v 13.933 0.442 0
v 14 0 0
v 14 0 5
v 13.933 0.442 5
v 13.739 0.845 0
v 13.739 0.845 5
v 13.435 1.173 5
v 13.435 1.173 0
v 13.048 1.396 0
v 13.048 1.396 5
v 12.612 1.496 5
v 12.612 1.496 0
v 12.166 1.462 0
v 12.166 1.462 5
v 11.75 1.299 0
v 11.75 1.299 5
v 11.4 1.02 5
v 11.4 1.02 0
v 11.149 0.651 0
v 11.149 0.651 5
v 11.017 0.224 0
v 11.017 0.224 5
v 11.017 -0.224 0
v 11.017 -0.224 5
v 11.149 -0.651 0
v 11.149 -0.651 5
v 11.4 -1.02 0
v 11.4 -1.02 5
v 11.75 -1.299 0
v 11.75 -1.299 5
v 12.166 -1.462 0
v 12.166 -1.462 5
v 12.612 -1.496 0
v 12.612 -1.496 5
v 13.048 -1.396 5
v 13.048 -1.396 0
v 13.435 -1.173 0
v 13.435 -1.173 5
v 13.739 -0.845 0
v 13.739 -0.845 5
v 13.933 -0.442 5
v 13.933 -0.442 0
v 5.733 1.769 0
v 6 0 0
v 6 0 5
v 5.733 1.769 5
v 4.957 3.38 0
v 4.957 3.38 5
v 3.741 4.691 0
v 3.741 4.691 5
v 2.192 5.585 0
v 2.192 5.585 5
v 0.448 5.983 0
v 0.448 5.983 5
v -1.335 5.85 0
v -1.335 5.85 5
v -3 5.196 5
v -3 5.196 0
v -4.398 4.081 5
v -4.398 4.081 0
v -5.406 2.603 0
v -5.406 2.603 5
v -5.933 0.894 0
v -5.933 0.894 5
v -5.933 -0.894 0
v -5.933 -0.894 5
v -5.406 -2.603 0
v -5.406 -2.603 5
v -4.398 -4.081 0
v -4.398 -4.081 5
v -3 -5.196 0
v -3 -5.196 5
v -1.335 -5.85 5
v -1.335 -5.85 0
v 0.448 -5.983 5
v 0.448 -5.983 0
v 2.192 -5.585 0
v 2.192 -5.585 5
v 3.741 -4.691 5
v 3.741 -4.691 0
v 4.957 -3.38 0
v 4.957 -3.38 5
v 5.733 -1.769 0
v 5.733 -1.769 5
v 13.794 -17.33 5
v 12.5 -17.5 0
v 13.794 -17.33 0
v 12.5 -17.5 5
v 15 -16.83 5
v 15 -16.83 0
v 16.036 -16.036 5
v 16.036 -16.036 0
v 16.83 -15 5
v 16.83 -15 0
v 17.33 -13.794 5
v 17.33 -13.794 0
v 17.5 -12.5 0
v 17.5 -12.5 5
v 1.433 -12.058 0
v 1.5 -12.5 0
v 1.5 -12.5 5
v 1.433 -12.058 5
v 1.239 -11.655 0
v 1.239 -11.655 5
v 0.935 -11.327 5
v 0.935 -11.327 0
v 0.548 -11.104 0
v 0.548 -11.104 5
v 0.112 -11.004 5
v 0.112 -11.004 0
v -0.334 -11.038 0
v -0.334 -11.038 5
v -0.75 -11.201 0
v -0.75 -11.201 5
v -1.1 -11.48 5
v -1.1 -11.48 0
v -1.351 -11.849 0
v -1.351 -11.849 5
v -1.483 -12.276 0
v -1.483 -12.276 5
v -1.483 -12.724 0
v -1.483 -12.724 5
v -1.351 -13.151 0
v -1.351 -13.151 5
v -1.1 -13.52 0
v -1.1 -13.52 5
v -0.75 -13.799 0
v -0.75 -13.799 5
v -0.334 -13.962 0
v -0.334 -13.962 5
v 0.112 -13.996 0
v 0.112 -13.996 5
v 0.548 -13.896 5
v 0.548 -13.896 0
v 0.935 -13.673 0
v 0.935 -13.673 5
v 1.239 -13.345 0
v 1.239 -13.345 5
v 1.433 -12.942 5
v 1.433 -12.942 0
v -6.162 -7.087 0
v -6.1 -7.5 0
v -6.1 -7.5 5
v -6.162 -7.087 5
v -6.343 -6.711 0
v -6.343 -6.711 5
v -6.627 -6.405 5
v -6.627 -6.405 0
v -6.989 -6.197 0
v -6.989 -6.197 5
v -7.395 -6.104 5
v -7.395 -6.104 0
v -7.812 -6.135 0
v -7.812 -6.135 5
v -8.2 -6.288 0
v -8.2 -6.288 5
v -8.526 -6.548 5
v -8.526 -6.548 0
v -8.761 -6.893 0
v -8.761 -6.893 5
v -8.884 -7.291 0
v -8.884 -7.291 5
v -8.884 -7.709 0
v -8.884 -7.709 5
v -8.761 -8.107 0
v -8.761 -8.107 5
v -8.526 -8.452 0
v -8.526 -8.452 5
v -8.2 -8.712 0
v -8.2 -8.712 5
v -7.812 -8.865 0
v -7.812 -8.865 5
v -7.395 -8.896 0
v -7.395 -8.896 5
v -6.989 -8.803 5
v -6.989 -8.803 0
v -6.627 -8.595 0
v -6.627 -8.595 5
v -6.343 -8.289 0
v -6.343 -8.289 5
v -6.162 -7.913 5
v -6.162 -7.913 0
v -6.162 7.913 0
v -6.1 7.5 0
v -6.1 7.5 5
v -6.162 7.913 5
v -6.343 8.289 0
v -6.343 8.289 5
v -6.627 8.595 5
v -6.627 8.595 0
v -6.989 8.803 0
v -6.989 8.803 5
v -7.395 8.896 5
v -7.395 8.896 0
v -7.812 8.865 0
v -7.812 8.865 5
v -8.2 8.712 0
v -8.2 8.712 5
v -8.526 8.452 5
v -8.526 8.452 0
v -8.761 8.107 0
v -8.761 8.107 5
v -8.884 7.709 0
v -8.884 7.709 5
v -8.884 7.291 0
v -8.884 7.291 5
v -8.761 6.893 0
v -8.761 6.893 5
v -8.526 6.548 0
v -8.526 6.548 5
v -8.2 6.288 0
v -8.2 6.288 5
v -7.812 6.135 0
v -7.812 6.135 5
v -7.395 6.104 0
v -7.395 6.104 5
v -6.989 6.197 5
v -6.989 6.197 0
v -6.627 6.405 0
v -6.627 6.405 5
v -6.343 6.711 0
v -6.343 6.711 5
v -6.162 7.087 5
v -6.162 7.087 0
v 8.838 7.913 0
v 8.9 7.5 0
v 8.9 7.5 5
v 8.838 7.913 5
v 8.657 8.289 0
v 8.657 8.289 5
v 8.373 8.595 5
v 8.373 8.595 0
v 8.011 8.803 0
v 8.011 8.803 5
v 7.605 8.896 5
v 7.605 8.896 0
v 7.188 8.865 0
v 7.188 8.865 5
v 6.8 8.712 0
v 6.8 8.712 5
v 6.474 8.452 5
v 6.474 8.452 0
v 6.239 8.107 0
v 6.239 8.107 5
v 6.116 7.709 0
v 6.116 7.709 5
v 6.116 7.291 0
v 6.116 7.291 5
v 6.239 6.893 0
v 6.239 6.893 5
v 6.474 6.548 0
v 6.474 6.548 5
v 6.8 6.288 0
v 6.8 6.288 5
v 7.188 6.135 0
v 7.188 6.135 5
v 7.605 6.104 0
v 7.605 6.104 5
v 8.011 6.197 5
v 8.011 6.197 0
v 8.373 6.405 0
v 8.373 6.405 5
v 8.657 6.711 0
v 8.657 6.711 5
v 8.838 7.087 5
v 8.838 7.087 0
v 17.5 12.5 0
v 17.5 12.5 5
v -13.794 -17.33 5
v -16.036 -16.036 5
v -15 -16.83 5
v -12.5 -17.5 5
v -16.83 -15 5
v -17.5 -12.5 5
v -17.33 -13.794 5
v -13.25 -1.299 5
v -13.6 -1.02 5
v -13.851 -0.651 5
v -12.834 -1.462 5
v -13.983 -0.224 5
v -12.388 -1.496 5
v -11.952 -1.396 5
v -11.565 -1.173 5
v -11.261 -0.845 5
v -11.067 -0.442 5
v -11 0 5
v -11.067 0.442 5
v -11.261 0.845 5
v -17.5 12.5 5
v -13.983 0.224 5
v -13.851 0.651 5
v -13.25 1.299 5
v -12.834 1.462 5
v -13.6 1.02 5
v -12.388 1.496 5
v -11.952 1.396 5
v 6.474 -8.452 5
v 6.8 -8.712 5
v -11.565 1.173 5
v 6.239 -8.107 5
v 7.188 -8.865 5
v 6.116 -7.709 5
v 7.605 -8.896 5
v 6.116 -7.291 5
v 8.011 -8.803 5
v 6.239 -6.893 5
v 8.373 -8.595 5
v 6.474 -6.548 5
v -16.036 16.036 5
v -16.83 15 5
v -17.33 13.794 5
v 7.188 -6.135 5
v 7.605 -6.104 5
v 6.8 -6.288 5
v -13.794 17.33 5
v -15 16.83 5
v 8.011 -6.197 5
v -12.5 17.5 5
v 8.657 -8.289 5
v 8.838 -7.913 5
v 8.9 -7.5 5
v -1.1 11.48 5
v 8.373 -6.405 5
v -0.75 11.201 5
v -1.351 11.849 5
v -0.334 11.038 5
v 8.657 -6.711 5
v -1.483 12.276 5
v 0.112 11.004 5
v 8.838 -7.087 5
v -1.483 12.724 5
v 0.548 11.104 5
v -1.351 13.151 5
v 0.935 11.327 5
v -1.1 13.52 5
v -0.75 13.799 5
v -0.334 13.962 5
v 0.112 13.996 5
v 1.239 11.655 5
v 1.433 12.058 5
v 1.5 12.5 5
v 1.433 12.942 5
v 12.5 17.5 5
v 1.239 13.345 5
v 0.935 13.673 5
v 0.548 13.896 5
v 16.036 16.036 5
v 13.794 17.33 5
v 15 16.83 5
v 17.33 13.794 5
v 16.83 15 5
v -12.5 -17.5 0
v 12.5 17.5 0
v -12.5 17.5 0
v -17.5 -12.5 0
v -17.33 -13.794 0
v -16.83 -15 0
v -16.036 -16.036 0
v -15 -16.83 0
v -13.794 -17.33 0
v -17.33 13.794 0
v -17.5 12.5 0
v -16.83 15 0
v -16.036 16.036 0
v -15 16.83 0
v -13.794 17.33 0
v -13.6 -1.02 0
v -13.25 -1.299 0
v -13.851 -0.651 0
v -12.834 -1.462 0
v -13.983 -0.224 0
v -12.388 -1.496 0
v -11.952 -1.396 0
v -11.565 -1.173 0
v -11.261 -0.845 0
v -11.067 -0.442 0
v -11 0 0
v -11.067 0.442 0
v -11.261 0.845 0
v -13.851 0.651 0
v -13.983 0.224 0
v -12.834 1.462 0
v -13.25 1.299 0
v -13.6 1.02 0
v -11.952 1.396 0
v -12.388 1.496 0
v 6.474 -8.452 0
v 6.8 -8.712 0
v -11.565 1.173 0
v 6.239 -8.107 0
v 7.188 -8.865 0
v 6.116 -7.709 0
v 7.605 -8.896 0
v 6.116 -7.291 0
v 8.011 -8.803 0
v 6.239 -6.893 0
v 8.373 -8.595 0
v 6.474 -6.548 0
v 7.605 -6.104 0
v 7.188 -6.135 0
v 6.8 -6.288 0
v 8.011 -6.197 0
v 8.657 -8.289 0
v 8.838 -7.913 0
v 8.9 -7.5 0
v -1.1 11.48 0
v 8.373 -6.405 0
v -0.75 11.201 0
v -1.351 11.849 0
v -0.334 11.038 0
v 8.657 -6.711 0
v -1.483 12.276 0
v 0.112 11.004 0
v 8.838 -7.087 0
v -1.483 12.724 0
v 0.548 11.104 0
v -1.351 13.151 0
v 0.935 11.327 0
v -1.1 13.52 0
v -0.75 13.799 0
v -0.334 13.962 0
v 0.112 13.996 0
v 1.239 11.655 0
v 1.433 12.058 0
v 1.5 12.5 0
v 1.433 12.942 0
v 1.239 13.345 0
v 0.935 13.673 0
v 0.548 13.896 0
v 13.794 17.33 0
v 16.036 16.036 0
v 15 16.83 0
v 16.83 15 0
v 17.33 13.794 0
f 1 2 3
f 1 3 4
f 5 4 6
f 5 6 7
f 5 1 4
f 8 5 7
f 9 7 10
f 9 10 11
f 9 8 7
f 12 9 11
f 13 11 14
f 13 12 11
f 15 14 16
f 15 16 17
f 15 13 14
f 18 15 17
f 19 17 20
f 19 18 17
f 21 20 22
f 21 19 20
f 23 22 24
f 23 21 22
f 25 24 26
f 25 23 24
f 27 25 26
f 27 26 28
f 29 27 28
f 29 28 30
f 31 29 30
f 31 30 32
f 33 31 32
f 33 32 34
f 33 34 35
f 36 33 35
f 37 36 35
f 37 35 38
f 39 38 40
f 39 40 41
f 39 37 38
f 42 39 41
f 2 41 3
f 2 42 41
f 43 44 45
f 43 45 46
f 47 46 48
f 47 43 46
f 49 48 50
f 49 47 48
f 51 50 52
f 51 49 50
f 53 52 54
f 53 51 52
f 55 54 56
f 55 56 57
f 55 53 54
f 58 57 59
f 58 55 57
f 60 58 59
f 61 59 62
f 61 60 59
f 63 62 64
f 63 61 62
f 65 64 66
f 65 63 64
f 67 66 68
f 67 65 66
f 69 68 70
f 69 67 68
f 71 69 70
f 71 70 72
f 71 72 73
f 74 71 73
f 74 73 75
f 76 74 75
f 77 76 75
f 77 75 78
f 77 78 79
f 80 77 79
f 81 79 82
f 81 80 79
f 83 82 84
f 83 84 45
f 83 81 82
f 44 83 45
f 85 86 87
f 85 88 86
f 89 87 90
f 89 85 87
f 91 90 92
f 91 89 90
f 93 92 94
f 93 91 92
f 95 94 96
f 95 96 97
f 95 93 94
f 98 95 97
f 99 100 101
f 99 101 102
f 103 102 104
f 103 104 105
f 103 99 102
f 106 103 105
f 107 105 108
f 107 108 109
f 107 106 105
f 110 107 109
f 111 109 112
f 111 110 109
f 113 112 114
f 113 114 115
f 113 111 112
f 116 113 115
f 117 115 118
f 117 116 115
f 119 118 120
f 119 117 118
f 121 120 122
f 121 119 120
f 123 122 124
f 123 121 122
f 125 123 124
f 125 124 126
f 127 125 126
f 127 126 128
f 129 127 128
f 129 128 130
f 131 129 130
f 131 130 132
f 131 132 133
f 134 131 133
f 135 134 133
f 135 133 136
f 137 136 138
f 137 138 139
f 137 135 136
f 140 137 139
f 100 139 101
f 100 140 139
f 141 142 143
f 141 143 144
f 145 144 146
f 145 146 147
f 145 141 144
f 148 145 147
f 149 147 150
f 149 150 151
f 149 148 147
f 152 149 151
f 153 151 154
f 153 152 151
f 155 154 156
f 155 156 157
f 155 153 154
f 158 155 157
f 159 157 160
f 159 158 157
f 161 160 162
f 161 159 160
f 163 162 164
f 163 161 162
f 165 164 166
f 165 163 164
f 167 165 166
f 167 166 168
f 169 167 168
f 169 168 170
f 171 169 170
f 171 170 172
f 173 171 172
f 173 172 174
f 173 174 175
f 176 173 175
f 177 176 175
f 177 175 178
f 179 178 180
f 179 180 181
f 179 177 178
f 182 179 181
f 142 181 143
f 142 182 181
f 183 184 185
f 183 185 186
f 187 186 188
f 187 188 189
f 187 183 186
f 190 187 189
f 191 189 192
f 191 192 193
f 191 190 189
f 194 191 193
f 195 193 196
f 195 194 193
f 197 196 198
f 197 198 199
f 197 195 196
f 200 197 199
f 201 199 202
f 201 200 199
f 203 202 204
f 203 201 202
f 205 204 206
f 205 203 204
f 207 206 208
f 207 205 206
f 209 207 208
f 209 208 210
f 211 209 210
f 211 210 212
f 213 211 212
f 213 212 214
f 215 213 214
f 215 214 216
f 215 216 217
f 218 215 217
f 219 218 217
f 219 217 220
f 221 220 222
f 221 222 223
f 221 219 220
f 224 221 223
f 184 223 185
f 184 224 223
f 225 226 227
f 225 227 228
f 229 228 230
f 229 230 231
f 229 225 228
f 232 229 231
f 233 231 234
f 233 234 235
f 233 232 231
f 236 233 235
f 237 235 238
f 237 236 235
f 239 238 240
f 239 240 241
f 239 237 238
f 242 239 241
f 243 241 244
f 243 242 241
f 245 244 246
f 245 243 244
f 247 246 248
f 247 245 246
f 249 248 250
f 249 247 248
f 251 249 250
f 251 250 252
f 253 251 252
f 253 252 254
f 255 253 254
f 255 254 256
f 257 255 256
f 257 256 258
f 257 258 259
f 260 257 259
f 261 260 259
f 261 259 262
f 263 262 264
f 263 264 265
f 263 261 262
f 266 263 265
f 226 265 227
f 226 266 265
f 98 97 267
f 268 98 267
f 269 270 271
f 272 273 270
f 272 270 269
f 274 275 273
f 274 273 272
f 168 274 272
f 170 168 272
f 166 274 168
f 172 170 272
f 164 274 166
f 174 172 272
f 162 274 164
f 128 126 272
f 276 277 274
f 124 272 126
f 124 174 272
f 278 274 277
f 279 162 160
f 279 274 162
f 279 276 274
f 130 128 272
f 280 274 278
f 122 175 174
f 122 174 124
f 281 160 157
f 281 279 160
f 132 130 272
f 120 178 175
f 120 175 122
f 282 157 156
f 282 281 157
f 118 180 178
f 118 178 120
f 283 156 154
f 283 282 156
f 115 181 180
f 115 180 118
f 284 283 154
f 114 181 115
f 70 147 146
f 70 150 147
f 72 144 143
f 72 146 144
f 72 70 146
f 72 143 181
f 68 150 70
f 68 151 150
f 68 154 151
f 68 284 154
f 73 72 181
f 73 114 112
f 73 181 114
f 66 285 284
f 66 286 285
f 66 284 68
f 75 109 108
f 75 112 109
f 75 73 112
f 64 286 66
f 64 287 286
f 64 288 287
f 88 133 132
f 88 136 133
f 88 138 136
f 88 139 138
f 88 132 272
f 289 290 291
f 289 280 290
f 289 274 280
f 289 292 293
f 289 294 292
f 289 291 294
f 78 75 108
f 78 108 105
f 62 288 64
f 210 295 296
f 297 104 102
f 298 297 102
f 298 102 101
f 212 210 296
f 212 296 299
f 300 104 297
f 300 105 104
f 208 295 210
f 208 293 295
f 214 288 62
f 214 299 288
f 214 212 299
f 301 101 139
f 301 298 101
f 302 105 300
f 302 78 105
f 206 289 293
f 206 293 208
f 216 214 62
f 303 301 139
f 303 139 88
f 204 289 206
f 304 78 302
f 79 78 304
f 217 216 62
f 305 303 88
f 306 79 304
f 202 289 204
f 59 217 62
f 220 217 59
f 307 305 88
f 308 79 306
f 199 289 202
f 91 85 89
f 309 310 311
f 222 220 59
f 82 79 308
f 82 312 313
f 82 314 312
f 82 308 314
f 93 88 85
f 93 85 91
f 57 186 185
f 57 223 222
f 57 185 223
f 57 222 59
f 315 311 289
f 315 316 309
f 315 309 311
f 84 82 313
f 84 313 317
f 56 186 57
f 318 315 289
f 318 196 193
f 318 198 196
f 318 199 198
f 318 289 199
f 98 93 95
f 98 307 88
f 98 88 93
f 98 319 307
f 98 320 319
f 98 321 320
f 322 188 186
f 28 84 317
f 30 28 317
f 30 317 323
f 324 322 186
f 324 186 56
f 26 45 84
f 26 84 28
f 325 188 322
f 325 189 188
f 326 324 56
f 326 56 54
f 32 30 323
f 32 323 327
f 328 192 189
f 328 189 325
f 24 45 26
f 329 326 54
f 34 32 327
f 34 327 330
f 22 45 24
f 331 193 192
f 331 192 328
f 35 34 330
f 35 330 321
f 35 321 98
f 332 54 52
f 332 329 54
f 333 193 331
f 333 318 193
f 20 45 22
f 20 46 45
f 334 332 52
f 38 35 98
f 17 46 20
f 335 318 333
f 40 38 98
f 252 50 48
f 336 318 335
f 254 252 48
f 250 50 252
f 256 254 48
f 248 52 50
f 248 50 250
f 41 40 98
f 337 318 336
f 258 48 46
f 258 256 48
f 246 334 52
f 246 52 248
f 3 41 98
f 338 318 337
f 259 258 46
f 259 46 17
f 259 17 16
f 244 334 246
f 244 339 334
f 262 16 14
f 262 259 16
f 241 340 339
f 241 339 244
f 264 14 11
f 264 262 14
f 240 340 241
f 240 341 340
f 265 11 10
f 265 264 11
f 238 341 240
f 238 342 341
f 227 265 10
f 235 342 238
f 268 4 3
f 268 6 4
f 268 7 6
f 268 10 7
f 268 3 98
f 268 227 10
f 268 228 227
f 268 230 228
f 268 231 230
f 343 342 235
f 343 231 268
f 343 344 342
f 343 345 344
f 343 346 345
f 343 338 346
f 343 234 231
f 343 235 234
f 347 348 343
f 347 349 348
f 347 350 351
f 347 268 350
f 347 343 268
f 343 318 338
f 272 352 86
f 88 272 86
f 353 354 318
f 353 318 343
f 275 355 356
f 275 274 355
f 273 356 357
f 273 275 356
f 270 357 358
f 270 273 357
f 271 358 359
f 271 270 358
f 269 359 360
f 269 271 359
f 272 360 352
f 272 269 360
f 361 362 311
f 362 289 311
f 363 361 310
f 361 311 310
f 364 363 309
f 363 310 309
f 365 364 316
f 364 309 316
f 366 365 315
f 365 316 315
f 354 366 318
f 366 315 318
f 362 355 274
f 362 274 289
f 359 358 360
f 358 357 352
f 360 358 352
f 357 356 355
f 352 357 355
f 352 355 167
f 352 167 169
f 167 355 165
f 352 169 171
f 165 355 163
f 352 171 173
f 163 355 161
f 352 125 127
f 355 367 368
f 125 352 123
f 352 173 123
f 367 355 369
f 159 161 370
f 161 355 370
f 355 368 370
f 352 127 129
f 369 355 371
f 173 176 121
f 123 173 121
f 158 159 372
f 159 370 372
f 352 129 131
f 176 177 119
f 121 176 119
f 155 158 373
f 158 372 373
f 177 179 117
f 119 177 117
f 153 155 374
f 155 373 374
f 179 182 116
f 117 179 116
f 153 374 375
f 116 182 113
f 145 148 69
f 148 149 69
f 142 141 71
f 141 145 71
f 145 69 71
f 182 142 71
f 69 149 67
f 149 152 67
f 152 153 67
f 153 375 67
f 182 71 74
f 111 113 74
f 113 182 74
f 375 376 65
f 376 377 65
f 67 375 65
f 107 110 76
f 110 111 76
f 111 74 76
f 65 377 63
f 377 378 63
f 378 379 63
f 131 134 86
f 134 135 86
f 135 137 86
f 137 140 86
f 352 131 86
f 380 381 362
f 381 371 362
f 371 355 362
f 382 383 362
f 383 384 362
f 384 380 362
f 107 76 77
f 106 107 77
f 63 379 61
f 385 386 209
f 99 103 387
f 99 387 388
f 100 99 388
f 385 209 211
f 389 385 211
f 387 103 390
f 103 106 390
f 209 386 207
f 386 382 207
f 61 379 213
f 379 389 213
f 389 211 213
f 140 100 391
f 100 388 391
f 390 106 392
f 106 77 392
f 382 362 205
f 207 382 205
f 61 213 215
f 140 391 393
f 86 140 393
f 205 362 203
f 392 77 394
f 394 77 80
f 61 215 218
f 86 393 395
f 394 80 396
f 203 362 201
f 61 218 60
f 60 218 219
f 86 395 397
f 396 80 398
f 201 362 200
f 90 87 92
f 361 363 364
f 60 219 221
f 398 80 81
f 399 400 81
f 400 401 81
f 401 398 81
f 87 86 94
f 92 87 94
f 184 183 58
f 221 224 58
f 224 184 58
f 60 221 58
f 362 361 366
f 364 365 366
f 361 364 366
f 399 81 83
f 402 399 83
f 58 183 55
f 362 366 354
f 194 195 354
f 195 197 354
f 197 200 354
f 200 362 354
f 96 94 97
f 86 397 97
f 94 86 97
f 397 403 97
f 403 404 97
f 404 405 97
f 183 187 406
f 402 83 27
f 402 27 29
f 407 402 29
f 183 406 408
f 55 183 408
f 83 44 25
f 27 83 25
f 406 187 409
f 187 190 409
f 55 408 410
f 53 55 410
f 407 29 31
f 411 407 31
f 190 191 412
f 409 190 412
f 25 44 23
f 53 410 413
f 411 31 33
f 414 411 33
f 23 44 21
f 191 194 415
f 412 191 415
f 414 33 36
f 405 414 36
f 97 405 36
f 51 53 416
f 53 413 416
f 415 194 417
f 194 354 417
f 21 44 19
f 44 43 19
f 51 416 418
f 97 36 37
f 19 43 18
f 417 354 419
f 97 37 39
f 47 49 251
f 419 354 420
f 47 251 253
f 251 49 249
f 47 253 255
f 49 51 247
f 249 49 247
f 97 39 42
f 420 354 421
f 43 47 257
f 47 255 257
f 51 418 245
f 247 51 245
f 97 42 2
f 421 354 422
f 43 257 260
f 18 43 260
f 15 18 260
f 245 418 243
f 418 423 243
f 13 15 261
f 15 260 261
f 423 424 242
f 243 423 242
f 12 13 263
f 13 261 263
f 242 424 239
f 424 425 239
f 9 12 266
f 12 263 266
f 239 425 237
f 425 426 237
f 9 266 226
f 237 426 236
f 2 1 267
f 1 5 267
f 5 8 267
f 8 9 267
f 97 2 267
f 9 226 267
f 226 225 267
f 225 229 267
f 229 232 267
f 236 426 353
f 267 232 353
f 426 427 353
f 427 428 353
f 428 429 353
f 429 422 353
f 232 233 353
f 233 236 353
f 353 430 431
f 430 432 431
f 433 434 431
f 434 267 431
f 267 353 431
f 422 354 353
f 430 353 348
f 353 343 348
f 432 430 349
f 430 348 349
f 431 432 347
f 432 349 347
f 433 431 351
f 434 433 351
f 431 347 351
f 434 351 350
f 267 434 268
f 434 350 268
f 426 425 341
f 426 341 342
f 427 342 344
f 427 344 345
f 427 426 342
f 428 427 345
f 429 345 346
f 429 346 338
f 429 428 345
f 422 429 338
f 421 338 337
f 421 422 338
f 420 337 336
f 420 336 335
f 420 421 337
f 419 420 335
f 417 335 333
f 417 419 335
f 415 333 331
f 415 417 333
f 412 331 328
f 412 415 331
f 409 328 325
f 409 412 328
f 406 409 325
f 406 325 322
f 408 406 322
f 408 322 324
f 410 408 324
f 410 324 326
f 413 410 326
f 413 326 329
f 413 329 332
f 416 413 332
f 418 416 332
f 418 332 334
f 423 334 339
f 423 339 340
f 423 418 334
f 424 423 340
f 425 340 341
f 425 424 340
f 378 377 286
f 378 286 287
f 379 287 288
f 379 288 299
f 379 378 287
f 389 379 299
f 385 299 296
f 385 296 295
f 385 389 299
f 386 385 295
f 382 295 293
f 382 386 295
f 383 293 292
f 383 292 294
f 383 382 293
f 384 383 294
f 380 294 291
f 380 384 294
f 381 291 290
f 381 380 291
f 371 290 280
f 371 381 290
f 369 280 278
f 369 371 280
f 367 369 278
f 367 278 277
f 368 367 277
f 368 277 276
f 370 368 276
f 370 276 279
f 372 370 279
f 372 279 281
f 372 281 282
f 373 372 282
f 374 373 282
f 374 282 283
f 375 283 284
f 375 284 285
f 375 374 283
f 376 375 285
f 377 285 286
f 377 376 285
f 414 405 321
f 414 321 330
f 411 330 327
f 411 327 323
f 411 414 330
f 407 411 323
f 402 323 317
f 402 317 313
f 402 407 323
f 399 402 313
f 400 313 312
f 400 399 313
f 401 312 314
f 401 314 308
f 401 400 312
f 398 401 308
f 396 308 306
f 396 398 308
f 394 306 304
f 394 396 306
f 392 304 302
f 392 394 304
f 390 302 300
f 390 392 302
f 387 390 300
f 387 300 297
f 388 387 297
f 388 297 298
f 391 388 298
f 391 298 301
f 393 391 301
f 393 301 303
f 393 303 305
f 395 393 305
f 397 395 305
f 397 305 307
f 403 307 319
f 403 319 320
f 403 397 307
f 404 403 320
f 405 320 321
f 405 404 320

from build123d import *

# Parameters (mm, degrees)
SKETCH_1_W      = 35
SKETCH_1_H      = 35
SKETCH_1_R      = 1.5
SKETCH_1_R_2    = 6
SKETCH_1_R_3    = 1.4
EXTRUDE_1_DEPTH = 5
FILLET_1_R      = 5


with BuildPart() as part:
    # 草图1 → 凸台-拉伸1 (new body)
    with BuildSketch(Plane.XY):
        Rectangle(SKETCH_1_W, SKETCH_1_H)
        with Locations((0, 12.5)):
            Circle(SKETCH_1_R, mode=Mode.SUBTRACT)
        with Locations((12.5, 0)):
            Circle(SKETCH_1_R, mode=Mode.SUBTRACT)
        with Locations((0, -12.5)):
            Circle(SKETCH_1_R, mode=Mode.SUBTRACT)
        with Locations((-12.5, 0)):
            Circle(SKETCH_1_R, mode=Mode.SUBTRACT)
        Circle(SKETCH_1_R_2, mode=Mode.SUBTRACT)
        with Locations((-7.5, 7.5)):
            Circle(SKETCH_1_R_3, mode=Mode.SUBTRACT)
        with Locations((7.5, 7.5)):
            Circle(SKETCH_1_R_3, mode=Mode.SUBTRACT)
        with Locations((7.5, -7.5)):
            Circle(SKETCH_1_R_3, mode=Mode.SUBTRACT)
        with Locations((-7.5, -7.5)):
            Circle(SKETCH_1_R_3, mode=Mode.SUBTRACT)
    extrude(amount=EXTRUDE_1_DEPTH)

    # 圆角1
    fillet_1_edges = [part.edges().sort_by_distance(p)[0] for p in [
        (17.5, -17.5, 2.5),
        (-17.5, -17.5, 2.5),
        (-17.5, 17.5, 2.5),
        (17.5, 17.5, 2.5),
    ]]
    fillet(fillet_1_edges, radius=FILLET_1_R)


solid = part.part
